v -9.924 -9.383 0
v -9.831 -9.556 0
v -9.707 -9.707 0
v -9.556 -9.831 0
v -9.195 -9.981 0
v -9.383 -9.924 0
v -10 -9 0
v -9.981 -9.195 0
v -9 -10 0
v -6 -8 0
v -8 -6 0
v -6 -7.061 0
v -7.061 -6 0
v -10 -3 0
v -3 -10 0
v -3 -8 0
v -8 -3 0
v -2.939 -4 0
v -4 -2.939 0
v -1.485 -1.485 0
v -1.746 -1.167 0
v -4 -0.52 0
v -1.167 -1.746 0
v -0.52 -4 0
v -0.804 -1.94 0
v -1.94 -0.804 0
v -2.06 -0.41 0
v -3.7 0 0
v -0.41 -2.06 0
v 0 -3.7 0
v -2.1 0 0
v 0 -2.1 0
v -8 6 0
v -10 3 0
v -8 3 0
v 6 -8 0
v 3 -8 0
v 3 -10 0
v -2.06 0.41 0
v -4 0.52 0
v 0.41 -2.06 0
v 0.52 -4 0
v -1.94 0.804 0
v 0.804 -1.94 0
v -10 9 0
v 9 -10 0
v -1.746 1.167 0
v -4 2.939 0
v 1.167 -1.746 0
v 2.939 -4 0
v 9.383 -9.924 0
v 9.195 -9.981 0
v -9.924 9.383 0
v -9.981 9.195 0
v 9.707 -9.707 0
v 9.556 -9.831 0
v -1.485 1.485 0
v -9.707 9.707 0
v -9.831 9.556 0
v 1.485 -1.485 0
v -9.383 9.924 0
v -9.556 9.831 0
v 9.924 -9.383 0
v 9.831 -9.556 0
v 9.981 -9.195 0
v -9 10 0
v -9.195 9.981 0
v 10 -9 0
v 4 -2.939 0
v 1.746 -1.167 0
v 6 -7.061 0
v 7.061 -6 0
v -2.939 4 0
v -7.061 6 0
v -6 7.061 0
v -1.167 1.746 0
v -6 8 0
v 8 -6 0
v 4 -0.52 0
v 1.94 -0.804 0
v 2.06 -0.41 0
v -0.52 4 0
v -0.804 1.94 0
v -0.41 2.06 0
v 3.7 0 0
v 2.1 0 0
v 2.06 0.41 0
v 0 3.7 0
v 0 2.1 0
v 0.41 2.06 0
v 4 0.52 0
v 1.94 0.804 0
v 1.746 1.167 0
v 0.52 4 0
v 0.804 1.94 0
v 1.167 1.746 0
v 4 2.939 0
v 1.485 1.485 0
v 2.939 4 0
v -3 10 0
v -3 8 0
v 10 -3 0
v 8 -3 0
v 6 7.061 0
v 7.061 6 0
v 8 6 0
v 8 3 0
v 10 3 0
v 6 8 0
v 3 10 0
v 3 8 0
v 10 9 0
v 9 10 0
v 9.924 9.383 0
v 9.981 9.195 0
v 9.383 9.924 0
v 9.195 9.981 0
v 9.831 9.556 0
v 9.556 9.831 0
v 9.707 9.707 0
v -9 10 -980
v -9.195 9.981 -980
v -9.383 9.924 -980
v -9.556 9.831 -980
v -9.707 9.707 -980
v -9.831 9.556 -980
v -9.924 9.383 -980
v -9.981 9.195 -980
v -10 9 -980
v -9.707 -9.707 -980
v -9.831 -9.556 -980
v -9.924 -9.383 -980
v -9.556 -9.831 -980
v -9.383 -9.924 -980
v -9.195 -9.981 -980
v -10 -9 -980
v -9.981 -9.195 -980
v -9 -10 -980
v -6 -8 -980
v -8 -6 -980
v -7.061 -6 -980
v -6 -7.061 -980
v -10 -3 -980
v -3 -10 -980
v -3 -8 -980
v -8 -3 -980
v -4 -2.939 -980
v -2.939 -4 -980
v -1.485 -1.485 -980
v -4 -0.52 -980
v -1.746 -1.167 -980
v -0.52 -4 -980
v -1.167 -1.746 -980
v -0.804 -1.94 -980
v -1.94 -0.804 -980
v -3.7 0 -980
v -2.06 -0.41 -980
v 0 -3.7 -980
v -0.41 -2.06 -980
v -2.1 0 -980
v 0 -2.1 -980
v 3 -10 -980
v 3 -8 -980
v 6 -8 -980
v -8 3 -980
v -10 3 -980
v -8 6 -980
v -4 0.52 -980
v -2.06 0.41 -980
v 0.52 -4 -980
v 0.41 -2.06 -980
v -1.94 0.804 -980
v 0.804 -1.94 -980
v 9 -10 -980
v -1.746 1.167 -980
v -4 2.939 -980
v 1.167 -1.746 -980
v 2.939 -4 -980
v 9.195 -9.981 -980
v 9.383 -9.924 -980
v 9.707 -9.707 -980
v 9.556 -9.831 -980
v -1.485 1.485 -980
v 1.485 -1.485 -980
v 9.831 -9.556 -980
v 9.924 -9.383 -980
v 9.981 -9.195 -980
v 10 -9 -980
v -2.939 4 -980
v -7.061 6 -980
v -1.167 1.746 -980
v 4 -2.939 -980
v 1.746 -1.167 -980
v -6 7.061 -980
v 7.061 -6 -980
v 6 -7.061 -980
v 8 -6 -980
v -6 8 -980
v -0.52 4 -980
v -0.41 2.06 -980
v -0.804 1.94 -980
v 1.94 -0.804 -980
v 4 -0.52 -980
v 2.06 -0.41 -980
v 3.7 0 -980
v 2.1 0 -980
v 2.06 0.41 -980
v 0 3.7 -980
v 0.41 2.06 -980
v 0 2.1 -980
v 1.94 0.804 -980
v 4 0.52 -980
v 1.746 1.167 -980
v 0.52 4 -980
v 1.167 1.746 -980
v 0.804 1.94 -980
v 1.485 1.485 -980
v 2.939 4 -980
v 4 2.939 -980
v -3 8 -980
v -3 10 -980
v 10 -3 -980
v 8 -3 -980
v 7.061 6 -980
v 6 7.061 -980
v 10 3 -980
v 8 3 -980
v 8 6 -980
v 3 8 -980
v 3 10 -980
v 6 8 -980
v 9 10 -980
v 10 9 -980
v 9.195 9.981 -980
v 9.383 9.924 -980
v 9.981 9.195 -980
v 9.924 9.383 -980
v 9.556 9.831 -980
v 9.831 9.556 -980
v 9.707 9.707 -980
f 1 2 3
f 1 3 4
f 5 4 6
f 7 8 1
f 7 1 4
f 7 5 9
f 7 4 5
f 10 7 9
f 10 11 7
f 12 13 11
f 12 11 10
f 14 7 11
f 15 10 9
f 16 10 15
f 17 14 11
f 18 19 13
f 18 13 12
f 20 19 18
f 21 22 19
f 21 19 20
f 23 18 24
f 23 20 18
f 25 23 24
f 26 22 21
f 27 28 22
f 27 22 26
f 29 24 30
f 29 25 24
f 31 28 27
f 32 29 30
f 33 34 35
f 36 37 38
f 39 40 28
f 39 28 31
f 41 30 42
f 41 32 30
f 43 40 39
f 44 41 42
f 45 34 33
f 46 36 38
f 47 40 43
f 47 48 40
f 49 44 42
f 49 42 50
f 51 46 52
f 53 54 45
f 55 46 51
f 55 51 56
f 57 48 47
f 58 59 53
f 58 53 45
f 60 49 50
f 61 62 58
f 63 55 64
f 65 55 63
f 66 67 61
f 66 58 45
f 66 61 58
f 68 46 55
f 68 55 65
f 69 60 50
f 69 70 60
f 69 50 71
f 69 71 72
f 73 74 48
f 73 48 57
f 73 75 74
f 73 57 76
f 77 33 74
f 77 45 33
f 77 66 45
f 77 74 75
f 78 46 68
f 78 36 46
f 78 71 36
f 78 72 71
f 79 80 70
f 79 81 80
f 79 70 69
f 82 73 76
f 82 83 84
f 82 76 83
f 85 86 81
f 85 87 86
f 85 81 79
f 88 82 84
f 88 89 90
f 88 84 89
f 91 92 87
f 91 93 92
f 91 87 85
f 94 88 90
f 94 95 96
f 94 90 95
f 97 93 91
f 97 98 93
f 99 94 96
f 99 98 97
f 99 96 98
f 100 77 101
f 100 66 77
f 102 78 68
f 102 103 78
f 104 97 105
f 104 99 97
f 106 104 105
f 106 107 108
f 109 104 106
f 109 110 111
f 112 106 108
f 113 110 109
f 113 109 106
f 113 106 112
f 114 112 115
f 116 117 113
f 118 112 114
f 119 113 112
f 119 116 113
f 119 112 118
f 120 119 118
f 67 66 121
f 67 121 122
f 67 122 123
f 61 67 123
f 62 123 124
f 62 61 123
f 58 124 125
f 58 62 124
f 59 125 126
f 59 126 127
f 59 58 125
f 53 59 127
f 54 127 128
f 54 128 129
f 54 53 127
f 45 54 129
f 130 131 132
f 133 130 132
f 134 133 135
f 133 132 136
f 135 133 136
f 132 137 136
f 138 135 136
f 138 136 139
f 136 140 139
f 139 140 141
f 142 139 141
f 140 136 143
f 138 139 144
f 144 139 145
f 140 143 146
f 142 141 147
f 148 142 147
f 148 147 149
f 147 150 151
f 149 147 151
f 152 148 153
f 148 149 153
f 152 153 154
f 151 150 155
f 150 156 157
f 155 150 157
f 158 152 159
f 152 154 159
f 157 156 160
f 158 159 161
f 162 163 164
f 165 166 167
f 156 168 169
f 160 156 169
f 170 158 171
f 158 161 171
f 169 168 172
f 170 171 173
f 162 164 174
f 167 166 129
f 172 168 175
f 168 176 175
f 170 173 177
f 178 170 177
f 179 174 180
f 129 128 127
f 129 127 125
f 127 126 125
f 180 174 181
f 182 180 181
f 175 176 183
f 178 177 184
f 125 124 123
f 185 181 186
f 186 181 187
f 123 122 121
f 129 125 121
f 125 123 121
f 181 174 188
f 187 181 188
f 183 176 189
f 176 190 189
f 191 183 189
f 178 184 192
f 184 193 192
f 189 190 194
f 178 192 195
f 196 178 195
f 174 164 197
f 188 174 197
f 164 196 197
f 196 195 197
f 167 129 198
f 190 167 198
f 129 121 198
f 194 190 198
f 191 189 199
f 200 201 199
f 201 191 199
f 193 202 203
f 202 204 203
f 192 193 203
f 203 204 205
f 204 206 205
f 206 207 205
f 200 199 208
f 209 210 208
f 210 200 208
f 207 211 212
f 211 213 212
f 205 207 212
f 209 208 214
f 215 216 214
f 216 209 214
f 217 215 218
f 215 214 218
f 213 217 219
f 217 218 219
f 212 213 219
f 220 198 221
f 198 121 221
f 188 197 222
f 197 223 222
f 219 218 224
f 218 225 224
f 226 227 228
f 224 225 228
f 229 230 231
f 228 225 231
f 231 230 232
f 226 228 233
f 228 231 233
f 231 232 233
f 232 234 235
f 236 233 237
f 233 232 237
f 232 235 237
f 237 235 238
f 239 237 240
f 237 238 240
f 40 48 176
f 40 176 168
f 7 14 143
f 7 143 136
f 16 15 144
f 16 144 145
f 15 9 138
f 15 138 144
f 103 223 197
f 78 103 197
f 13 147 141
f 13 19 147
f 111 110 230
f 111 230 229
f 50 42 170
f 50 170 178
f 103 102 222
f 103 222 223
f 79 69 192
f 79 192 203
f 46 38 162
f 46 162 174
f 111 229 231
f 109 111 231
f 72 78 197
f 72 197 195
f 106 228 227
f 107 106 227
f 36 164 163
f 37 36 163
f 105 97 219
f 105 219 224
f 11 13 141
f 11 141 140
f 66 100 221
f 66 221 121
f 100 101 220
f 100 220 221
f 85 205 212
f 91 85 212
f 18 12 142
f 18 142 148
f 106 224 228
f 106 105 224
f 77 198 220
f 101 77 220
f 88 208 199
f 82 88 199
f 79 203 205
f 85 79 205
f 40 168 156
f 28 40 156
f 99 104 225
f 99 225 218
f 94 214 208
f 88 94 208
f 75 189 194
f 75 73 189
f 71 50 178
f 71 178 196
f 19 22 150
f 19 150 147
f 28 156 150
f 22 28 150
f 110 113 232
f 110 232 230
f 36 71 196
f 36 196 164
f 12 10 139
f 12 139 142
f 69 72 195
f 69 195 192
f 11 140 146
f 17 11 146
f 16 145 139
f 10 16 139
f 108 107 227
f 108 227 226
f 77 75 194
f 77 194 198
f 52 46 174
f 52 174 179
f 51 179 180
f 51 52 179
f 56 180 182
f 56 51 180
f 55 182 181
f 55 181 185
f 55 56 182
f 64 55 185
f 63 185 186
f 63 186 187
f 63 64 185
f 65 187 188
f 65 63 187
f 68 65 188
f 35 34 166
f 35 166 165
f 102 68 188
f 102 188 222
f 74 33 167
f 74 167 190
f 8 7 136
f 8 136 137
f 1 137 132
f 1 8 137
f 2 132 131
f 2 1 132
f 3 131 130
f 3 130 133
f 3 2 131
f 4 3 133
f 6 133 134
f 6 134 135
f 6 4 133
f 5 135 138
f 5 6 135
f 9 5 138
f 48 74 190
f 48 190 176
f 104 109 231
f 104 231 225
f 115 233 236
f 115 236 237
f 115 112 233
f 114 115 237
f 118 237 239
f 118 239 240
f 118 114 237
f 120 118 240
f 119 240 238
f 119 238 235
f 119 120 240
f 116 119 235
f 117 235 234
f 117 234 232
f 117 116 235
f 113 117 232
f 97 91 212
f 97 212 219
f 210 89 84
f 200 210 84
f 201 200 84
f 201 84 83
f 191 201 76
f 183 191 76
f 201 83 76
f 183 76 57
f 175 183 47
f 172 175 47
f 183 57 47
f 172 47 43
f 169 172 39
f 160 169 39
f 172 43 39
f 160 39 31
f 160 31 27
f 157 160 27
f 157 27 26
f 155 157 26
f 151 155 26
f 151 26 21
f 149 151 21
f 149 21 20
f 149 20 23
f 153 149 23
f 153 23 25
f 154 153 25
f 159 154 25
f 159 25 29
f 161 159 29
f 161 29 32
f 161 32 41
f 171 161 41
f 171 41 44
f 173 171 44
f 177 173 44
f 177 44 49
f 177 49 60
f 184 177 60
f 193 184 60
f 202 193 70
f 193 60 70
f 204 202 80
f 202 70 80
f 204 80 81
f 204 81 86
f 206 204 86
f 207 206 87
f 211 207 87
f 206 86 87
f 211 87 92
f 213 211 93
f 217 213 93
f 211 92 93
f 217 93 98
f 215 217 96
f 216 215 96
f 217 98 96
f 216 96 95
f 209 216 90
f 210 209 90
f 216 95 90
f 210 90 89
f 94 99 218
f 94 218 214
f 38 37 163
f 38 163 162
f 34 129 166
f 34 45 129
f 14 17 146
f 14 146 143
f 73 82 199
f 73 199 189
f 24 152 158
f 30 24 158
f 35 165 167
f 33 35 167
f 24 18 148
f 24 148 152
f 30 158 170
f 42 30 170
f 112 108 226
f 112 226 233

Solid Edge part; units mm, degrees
sketch "Sketch1" plane through (0, 0, 0) normal (0, 0, 1) x (1, 0, 0)
  line L0 (-10, -3) -> (-10, -9)
  arc A0 (-10, -9) -> (-9, -10) centre (-9, -9) ccw
  line L1 (-9, -10) -> (-3, -10)
  line L2 (-3, -10) -> (-3, -8)
  line L3 (-3, -8) -> (-6, -8)
  line L4 (-6, -8) -> (-6, -7.0607)
  line L5 (-6, -7.0607) -> (-2.9393, -4)
  line L6 (-2.9393, -4) -> (-0.5196, -4)
  line L7 (-0.5196, -4) -> (0, -3.7)
  line L8 (0, -3.7) -> (0.5196, -4)
  line L9 (0.5196, -4) -> (2.9393, -4)
  line L10 (2.9393, -4) -> (6, -7.0607)
  line L11 (6, -7.0607) -> (6, -8)
  line L12 (6, -8) -> (3, -8)
  line L13 (3, -8) -> (3, -10)
  line L14 (3, -10) -> (9, -10)
  arc A1 (9, -10) -> (10, -9) centre (9, -9) ccw
  line L15 (10, -9) -> (10, -3)
  line L16 (10, -3) -> (8, -3)
  line L17 (8, -3) -> (8, -6)
  line L18 (8, -6) -> (7.0607, -6)
  line L19 (7.0607, -6) -> (4, -2.9393)
  line L20 (4, -2.9393) -> (4, -0.5196)
  line L21 (4, -0.5196) -> (3.7, 0)
  line L22 (3.7, 0) -> (4, 0.5196)
  line L23 (4, 0.5196) -> (4, 2.9393)
  line L24 (4, 2.9393) -> (7.0607, 6)
  line L25 (7.0607, 6) -> (8, 6)
  line L26 (8, 6) -> (8, 3)
  line L27 (8, 3) -> (10, 3)
  line L28 (10, 3) -> (10, 9)
  arc A2 (10, 9) -> (9, 10) centre (9, 9) ccw
  line L29 (9, 10) -> (3, 10)
  line L30 (3, 10) -> (3, 8)
  line L31 (3, 8) -> (6, 8)
  line L32 (6, 8) -> (6, 7.0607)
  line L33 (6, 7.0607) -> (2.9393, 4)
  line L34 (2.9393, 4) -> (0.5196, 4)
  line L35 (0.5196, 4) -> (0, 3.7)
  line L36 (0, 3.7) -> (-0.5196, 4)
  line L37 (-0.5196, 4) -> (-2.9393, 4)
  line L38 (-2.9393, 4) -> (-6, 7.0607)
  line L39 (-6, 7.0607) -> (-6, 8)
  line L40 (-6, 8) -> (-3, 8)
  line L41 (-3, 8) -> (-3, 10)
  line L42 (-3, 10) -> (-9, 10)
  arc A3 (-9, 10) -> (-10, 9) centre (-9, 9) ccw
  line L43 (-10, 9) -> (-10, 3)
  line L44 (-10, 3) -> (-8, 3)
  line L45 (-8, 3) -> (-8, 6)
  line L46 (-8, 6) -> (-7.0607, 6)
  line L47 (-7.0607, 6) -> (-4, 2.9393)
  line L48 (-4, 2.9393) -> (-4, 0.5196)
  line L49 (-4, 0.5196) -> (-3.7, 0)
  line L50 (-3.7, 0) -> (-4, -0.5196)
  line L51 (-4, -0.5196) -> (-4, -2.9393)
  line L52 (-4, -2.9393) -> (-7.0607, -6)
  line L53 (-7.0607, -6) -> (-8, -6)
  line L54 (-8, -6) -> (-8, -3)
  line L55 (-8, -3) -> (-10, -3)
extrude "Protrusion1" add sketch "Sketch1" against normal blind 980
hole "Bohrung_1" at (0, 0, -980) direction (0, 0, 1) diameter 4.2 depth 980
properties part number "HFS5-2020-980"
